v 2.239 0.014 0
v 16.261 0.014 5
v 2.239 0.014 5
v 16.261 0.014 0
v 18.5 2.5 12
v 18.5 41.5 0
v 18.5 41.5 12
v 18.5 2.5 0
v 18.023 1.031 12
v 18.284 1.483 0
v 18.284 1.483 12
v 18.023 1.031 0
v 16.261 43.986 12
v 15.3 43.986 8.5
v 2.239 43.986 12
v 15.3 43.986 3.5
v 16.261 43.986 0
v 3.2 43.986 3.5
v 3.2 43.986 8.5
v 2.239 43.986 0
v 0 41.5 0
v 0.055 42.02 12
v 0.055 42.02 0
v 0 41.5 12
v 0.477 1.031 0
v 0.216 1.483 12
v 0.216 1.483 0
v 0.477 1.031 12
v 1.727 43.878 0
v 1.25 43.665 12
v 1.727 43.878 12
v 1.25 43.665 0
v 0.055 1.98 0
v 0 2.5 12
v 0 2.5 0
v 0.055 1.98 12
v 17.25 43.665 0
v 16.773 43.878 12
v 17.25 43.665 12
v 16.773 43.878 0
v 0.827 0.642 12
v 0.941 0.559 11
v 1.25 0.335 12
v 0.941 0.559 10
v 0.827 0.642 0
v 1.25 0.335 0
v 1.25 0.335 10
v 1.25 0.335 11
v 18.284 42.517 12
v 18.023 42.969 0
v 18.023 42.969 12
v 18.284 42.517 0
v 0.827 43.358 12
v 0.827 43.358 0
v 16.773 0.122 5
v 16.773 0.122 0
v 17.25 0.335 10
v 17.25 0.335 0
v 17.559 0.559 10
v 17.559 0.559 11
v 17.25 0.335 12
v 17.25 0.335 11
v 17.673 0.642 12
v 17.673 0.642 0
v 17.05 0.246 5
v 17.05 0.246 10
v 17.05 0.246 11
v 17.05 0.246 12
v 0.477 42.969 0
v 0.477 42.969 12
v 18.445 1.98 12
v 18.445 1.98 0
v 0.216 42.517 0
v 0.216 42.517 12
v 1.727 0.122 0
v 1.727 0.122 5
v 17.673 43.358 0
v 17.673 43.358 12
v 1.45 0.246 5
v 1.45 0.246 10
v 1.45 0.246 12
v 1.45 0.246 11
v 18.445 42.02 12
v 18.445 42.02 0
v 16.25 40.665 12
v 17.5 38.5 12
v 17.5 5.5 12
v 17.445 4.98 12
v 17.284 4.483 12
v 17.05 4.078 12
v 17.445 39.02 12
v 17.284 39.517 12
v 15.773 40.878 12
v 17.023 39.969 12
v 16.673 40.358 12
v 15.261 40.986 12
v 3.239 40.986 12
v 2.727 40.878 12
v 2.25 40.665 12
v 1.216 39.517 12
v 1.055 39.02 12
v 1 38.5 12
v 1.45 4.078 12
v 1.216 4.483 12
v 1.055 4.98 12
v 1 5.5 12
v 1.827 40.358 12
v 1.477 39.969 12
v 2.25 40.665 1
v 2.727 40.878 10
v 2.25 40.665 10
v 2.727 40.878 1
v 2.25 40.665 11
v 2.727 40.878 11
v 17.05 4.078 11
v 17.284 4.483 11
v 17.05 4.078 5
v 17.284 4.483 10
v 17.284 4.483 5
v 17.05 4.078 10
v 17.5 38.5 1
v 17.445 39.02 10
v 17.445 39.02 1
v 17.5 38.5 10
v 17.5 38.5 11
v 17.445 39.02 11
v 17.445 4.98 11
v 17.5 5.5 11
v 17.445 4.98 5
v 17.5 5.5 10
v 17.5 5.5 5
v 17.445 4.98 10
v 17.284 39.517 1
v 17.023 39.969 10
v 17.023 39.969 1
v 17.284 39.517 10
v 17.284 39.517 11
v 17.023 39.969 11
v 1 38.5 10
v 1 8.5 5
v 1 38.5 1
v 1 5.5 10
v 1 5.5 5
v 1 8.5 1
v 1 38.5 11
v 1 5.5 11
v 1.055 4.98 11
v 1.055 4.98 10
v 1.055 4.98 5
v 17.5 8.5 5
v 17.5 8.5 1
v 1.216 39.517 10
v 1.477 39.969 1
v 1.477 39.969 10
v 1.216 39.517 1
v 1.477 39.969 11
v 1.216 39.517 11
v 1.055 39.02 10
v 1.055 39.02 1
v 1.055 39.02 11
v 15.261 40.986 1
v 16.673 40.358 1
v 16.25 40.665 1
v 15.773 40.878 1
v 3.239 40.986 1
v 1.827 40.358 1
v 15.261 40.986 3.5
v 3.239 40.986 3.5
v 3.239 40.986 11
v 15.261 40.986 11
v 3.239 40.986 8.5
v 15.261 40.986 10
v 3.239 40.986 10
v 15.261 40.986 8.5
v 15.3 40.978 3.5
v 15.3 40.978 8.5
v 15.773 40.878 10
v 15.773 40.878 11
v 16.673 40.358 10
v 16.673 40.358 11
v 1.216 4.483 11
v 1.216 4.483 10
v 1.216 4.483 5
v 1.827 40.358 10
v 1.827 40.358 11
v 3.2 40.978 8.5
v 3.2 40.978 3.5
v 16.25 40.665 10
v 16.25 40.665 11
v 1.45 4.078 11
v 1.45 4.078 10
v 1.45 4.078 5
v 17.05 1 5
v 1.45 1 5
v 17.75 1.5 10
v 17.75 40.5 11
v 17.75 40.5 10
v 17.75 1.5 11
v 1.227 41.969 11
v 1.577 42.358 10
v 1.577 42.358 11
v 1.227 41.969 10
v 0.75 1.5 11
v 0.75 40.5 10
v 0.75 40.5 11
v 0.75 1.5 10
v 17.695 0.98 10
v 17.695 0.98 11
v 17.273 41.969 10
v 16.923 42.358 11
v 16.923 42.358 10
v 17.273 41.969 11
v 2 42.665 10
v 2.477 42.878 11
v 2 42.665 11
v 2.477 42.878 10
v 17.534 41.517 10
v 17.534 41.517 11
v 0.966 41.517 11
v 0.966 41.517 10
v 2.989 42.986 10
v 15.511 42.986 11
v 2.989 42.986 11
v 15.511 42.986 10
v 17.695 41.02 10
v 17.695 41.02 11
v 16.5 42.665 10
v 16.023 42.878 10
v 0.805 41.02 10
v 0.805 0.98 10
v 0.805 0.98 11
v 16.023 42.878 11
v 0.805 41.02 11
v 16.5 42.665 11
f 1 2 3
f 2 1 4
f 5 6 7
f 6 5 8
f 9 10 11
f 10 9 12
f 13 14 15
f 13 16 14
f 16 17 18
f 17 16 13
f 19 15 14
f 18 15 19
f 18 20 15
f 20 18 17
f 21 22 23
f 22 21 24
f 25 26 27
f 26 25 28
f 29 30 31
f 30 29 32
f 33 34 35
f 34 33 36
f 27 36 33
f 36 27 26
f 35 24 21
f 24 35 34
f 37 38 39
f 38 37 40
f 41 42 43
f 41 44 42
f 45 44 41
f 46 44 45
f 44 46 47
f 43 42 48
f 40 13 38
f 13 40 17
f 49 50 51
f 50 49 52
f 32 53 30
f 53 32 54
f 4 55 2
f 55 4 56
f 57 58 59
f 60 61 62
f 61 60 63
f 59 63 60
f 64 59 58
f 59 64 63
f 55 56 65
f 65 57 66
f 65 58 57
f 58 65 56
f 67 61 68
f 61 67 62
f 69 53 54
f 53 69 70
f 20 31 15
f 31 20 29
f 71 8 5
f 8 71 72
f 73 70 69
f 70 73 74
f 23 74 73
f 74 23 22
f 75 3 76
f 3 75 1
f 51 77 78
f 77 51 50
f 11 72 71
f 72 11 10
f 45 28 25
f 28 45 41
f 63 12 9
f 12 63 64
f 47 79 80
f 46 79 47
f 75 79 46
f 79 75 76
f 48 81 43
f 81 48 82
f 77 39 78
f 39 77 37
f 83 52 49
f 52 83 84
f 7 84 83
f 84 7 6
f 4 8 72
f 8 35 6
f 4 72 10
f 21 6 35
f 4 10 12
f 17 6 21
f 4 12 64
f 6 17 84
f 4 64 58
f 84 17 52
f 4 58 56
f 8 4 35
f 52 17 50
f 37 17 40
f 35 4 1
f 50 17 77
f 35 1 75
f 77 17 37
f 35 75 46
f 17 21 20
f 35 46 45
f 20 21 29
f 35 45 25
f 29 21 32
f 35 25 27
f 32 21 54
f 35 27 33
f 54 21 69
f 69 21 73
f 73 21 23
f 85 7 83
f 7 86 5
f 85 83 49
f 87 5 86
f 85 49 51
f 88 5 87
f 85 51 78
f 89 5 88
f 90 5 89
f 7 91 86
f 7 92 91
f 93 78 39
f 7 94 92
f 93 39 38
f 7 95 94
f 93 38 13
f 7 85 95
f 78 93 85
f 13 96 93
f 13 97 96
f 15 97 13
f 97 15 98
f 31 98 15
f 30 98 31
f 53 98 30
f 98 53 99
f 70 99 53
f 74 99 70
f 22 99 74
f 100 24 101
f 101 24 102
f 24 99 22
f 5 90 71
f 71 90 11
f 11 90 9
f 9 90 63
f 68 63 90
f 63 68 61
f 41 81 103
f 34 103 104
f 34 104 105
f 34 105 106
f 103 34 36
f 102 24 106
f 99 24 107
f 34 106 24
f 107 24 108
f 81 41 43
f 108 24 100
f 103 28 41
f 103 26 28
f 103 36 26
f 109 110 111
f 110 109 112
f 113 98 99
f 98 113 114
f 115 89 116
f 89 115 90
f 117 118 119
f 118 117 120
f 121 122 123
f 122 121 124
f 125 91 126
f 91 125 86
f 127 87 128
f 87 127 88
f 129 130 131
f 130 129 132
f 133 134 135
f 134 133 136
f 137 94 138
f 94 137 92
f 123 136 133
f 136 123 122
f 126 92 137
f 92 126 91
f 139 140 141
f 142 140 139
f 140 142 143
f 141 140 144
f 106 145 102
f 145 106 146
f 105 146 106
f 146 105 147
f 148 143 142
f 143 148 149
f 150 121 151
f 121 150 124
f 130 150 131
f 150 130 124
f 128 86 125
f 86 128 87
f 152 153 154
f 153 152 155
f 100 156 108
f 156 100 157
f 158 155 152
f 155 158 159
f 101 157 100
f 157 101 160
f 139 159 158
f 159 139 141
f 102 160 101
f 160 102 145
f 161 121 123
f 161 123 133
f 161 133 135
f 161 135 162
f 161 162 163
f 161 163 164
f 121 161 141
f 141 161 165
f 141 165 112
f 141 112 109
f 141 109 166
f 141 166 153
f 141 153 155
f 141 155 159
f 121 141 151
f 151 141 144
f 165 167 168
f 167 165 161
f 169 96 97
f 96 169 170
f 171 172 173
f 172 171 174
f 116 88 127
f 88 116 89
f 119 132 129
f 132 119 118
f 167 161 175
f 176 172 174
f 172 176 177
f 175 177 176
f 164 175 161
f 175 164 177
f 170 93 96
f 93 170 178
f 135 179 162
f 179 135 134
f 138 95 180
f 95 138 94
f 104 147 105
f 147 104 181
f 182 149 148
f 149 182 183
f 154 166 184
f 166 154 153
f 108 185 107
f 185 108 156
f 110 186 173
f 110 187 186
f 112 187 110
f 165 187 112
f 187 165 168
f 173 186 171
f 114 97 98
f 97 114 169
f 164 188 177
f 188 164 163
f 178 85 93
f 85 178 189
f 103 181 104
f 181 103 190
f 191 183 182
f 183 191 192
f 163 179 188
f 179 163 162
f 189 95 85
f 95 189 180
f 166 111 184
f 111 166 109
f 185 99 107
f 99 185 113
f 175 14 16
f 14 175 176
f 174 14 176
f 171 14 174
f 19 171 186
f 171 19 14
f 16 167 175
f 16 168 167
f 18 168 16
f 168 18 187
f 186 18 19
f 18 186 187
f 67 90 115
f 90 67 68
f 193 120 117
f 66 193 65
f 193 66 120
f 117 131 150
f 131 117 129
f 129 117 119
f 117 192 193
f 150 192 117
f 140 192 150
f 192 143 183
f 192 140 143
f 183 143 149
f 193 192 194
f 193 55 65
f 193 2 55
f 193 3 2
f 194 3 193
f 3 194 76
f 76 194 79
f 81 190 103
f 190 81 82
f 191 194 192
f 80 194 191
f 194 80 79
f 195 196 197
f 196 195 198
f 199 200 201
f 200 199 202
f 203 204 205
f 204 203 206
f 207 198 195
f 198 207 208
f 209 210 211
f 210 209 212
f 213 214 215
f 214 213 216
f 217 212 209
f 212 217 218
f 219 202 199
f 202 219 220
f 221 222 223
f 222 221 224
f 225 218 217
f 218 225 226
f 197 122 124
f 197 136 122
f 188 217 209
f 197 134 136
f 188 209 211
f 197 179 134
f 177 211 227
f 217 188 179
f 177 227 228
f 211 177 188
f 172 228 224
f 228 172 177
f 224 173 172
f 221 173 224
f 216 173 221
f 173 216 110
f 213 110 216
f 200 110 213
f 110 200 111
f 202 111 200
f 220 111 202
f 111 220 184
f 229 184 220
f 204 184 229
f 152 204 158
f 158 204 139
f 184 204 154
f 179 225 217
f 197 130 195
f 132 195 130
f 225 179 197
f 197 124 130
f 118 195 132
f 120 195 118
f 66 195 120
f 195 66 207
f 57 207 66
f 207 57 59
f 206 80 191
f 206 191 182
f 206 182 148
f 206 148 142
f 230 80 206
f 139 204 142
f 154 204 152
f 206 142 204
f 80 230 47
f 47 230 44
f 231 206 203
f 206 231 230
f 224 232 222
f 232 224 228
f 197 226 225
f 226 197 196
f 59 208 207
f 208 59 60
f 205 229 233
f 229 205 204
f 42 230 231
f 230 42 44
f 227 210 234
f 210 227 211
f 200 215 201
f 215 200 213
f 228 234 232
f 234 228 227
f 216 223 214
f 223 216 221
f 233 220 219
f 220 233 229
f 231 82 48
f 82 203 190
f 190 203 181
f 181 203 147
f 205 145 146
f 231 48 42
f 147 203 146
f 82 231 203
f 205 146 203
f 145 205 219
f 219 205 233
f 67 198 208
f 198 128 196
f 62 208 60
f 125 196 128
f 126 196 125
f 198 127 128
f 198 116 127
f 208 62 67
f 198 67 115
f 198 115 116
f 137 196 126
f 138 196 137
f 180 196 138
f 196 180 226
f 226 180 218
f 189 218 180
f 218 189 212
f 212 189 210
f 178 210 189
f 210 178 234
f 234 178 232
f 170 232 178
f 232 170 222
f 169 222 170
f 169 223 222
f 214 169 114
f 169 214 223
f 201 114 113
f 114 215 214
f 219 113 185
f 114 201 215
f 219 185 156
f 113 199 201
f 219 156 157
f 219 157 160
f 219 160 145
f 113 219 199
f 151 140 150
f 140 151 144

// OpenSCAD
// Kolibri Case
// Copyright (c) 2023 Lone Dynamics Corporation

$fn = 30;

box_width = 18.5;
box_length = 44;
box_height = 12;
box_wall = 1;

mdd_box();

//translate([1,0,10.10])
//	mdd_lid();

module mdd_box() {
	
	union() {
		
		difference() {
		
			roundedcube(box_width, box_length, box_height, 2.5);
		
			// board cutout
			translate([box_wall,box_wall+2,box_wall]) {
				roundedcube(box_width-(box_wall*2),
					box_length-(box_wall*2)-4,
					box_height, 2.5);
			}
		
			// USB-A
			translate([box_width/2-12.1/2,38,box_wall+2.5])
				cube([12.1, 6, 5]);
		
			// PMOD
			translate([box_width/2-15.6/2,0,box_wall+4])
				cube([15.6, 6, 15]);
		
			// sliding LID cutout
			translate([0.75,-1,12-2]) {
				roundedcube(17,
					44,
					1, 2.5);
			}

		}
	
		// pin catch
		translate([1,1,0])
			cube([16.5,8.5-1,5]);
	
	}
	
}

module mdd_lid() {

	difference () {
		union() {
			
			color([0.3,0.3,0.2])
				roundedcube(16.5,
					43,
					0.75, 2.5);
	
			color([0.6,0.6,0.2])
				translate([1,1,0.5])
				roundedcube(14.5,
					39,
					1.25, 2.5);

		}
	
		rotate([0,0,90])
			translate([box_length/2,-box_width/2-0.5,1.5])
				linear_extrude(1)
					text("K O L I B R I", size=4, halign="center",
						font="Ubuntu:style=Bold");

	}
	
}

// https://gist.github.com/tinkerology/ae257c5340a33ee2f149ff3ae97d9826
module roundedcube(xx, yy, height, radius)
{
    translate([0,0,height/2])
    hull()
    {
        translate([radius,radius,0])
        cylinder(height,radius,radius,true);

        translate([xx-radius,radius,0])
        cylinder(height,radius,radius,true);

        translate([xx-radius,yy-radius,0])
        cylinder(height,radius,radius,true);

        translate([radius,yy-radius,0])
        cylinder(height,radius,radius,true);
    }
}
